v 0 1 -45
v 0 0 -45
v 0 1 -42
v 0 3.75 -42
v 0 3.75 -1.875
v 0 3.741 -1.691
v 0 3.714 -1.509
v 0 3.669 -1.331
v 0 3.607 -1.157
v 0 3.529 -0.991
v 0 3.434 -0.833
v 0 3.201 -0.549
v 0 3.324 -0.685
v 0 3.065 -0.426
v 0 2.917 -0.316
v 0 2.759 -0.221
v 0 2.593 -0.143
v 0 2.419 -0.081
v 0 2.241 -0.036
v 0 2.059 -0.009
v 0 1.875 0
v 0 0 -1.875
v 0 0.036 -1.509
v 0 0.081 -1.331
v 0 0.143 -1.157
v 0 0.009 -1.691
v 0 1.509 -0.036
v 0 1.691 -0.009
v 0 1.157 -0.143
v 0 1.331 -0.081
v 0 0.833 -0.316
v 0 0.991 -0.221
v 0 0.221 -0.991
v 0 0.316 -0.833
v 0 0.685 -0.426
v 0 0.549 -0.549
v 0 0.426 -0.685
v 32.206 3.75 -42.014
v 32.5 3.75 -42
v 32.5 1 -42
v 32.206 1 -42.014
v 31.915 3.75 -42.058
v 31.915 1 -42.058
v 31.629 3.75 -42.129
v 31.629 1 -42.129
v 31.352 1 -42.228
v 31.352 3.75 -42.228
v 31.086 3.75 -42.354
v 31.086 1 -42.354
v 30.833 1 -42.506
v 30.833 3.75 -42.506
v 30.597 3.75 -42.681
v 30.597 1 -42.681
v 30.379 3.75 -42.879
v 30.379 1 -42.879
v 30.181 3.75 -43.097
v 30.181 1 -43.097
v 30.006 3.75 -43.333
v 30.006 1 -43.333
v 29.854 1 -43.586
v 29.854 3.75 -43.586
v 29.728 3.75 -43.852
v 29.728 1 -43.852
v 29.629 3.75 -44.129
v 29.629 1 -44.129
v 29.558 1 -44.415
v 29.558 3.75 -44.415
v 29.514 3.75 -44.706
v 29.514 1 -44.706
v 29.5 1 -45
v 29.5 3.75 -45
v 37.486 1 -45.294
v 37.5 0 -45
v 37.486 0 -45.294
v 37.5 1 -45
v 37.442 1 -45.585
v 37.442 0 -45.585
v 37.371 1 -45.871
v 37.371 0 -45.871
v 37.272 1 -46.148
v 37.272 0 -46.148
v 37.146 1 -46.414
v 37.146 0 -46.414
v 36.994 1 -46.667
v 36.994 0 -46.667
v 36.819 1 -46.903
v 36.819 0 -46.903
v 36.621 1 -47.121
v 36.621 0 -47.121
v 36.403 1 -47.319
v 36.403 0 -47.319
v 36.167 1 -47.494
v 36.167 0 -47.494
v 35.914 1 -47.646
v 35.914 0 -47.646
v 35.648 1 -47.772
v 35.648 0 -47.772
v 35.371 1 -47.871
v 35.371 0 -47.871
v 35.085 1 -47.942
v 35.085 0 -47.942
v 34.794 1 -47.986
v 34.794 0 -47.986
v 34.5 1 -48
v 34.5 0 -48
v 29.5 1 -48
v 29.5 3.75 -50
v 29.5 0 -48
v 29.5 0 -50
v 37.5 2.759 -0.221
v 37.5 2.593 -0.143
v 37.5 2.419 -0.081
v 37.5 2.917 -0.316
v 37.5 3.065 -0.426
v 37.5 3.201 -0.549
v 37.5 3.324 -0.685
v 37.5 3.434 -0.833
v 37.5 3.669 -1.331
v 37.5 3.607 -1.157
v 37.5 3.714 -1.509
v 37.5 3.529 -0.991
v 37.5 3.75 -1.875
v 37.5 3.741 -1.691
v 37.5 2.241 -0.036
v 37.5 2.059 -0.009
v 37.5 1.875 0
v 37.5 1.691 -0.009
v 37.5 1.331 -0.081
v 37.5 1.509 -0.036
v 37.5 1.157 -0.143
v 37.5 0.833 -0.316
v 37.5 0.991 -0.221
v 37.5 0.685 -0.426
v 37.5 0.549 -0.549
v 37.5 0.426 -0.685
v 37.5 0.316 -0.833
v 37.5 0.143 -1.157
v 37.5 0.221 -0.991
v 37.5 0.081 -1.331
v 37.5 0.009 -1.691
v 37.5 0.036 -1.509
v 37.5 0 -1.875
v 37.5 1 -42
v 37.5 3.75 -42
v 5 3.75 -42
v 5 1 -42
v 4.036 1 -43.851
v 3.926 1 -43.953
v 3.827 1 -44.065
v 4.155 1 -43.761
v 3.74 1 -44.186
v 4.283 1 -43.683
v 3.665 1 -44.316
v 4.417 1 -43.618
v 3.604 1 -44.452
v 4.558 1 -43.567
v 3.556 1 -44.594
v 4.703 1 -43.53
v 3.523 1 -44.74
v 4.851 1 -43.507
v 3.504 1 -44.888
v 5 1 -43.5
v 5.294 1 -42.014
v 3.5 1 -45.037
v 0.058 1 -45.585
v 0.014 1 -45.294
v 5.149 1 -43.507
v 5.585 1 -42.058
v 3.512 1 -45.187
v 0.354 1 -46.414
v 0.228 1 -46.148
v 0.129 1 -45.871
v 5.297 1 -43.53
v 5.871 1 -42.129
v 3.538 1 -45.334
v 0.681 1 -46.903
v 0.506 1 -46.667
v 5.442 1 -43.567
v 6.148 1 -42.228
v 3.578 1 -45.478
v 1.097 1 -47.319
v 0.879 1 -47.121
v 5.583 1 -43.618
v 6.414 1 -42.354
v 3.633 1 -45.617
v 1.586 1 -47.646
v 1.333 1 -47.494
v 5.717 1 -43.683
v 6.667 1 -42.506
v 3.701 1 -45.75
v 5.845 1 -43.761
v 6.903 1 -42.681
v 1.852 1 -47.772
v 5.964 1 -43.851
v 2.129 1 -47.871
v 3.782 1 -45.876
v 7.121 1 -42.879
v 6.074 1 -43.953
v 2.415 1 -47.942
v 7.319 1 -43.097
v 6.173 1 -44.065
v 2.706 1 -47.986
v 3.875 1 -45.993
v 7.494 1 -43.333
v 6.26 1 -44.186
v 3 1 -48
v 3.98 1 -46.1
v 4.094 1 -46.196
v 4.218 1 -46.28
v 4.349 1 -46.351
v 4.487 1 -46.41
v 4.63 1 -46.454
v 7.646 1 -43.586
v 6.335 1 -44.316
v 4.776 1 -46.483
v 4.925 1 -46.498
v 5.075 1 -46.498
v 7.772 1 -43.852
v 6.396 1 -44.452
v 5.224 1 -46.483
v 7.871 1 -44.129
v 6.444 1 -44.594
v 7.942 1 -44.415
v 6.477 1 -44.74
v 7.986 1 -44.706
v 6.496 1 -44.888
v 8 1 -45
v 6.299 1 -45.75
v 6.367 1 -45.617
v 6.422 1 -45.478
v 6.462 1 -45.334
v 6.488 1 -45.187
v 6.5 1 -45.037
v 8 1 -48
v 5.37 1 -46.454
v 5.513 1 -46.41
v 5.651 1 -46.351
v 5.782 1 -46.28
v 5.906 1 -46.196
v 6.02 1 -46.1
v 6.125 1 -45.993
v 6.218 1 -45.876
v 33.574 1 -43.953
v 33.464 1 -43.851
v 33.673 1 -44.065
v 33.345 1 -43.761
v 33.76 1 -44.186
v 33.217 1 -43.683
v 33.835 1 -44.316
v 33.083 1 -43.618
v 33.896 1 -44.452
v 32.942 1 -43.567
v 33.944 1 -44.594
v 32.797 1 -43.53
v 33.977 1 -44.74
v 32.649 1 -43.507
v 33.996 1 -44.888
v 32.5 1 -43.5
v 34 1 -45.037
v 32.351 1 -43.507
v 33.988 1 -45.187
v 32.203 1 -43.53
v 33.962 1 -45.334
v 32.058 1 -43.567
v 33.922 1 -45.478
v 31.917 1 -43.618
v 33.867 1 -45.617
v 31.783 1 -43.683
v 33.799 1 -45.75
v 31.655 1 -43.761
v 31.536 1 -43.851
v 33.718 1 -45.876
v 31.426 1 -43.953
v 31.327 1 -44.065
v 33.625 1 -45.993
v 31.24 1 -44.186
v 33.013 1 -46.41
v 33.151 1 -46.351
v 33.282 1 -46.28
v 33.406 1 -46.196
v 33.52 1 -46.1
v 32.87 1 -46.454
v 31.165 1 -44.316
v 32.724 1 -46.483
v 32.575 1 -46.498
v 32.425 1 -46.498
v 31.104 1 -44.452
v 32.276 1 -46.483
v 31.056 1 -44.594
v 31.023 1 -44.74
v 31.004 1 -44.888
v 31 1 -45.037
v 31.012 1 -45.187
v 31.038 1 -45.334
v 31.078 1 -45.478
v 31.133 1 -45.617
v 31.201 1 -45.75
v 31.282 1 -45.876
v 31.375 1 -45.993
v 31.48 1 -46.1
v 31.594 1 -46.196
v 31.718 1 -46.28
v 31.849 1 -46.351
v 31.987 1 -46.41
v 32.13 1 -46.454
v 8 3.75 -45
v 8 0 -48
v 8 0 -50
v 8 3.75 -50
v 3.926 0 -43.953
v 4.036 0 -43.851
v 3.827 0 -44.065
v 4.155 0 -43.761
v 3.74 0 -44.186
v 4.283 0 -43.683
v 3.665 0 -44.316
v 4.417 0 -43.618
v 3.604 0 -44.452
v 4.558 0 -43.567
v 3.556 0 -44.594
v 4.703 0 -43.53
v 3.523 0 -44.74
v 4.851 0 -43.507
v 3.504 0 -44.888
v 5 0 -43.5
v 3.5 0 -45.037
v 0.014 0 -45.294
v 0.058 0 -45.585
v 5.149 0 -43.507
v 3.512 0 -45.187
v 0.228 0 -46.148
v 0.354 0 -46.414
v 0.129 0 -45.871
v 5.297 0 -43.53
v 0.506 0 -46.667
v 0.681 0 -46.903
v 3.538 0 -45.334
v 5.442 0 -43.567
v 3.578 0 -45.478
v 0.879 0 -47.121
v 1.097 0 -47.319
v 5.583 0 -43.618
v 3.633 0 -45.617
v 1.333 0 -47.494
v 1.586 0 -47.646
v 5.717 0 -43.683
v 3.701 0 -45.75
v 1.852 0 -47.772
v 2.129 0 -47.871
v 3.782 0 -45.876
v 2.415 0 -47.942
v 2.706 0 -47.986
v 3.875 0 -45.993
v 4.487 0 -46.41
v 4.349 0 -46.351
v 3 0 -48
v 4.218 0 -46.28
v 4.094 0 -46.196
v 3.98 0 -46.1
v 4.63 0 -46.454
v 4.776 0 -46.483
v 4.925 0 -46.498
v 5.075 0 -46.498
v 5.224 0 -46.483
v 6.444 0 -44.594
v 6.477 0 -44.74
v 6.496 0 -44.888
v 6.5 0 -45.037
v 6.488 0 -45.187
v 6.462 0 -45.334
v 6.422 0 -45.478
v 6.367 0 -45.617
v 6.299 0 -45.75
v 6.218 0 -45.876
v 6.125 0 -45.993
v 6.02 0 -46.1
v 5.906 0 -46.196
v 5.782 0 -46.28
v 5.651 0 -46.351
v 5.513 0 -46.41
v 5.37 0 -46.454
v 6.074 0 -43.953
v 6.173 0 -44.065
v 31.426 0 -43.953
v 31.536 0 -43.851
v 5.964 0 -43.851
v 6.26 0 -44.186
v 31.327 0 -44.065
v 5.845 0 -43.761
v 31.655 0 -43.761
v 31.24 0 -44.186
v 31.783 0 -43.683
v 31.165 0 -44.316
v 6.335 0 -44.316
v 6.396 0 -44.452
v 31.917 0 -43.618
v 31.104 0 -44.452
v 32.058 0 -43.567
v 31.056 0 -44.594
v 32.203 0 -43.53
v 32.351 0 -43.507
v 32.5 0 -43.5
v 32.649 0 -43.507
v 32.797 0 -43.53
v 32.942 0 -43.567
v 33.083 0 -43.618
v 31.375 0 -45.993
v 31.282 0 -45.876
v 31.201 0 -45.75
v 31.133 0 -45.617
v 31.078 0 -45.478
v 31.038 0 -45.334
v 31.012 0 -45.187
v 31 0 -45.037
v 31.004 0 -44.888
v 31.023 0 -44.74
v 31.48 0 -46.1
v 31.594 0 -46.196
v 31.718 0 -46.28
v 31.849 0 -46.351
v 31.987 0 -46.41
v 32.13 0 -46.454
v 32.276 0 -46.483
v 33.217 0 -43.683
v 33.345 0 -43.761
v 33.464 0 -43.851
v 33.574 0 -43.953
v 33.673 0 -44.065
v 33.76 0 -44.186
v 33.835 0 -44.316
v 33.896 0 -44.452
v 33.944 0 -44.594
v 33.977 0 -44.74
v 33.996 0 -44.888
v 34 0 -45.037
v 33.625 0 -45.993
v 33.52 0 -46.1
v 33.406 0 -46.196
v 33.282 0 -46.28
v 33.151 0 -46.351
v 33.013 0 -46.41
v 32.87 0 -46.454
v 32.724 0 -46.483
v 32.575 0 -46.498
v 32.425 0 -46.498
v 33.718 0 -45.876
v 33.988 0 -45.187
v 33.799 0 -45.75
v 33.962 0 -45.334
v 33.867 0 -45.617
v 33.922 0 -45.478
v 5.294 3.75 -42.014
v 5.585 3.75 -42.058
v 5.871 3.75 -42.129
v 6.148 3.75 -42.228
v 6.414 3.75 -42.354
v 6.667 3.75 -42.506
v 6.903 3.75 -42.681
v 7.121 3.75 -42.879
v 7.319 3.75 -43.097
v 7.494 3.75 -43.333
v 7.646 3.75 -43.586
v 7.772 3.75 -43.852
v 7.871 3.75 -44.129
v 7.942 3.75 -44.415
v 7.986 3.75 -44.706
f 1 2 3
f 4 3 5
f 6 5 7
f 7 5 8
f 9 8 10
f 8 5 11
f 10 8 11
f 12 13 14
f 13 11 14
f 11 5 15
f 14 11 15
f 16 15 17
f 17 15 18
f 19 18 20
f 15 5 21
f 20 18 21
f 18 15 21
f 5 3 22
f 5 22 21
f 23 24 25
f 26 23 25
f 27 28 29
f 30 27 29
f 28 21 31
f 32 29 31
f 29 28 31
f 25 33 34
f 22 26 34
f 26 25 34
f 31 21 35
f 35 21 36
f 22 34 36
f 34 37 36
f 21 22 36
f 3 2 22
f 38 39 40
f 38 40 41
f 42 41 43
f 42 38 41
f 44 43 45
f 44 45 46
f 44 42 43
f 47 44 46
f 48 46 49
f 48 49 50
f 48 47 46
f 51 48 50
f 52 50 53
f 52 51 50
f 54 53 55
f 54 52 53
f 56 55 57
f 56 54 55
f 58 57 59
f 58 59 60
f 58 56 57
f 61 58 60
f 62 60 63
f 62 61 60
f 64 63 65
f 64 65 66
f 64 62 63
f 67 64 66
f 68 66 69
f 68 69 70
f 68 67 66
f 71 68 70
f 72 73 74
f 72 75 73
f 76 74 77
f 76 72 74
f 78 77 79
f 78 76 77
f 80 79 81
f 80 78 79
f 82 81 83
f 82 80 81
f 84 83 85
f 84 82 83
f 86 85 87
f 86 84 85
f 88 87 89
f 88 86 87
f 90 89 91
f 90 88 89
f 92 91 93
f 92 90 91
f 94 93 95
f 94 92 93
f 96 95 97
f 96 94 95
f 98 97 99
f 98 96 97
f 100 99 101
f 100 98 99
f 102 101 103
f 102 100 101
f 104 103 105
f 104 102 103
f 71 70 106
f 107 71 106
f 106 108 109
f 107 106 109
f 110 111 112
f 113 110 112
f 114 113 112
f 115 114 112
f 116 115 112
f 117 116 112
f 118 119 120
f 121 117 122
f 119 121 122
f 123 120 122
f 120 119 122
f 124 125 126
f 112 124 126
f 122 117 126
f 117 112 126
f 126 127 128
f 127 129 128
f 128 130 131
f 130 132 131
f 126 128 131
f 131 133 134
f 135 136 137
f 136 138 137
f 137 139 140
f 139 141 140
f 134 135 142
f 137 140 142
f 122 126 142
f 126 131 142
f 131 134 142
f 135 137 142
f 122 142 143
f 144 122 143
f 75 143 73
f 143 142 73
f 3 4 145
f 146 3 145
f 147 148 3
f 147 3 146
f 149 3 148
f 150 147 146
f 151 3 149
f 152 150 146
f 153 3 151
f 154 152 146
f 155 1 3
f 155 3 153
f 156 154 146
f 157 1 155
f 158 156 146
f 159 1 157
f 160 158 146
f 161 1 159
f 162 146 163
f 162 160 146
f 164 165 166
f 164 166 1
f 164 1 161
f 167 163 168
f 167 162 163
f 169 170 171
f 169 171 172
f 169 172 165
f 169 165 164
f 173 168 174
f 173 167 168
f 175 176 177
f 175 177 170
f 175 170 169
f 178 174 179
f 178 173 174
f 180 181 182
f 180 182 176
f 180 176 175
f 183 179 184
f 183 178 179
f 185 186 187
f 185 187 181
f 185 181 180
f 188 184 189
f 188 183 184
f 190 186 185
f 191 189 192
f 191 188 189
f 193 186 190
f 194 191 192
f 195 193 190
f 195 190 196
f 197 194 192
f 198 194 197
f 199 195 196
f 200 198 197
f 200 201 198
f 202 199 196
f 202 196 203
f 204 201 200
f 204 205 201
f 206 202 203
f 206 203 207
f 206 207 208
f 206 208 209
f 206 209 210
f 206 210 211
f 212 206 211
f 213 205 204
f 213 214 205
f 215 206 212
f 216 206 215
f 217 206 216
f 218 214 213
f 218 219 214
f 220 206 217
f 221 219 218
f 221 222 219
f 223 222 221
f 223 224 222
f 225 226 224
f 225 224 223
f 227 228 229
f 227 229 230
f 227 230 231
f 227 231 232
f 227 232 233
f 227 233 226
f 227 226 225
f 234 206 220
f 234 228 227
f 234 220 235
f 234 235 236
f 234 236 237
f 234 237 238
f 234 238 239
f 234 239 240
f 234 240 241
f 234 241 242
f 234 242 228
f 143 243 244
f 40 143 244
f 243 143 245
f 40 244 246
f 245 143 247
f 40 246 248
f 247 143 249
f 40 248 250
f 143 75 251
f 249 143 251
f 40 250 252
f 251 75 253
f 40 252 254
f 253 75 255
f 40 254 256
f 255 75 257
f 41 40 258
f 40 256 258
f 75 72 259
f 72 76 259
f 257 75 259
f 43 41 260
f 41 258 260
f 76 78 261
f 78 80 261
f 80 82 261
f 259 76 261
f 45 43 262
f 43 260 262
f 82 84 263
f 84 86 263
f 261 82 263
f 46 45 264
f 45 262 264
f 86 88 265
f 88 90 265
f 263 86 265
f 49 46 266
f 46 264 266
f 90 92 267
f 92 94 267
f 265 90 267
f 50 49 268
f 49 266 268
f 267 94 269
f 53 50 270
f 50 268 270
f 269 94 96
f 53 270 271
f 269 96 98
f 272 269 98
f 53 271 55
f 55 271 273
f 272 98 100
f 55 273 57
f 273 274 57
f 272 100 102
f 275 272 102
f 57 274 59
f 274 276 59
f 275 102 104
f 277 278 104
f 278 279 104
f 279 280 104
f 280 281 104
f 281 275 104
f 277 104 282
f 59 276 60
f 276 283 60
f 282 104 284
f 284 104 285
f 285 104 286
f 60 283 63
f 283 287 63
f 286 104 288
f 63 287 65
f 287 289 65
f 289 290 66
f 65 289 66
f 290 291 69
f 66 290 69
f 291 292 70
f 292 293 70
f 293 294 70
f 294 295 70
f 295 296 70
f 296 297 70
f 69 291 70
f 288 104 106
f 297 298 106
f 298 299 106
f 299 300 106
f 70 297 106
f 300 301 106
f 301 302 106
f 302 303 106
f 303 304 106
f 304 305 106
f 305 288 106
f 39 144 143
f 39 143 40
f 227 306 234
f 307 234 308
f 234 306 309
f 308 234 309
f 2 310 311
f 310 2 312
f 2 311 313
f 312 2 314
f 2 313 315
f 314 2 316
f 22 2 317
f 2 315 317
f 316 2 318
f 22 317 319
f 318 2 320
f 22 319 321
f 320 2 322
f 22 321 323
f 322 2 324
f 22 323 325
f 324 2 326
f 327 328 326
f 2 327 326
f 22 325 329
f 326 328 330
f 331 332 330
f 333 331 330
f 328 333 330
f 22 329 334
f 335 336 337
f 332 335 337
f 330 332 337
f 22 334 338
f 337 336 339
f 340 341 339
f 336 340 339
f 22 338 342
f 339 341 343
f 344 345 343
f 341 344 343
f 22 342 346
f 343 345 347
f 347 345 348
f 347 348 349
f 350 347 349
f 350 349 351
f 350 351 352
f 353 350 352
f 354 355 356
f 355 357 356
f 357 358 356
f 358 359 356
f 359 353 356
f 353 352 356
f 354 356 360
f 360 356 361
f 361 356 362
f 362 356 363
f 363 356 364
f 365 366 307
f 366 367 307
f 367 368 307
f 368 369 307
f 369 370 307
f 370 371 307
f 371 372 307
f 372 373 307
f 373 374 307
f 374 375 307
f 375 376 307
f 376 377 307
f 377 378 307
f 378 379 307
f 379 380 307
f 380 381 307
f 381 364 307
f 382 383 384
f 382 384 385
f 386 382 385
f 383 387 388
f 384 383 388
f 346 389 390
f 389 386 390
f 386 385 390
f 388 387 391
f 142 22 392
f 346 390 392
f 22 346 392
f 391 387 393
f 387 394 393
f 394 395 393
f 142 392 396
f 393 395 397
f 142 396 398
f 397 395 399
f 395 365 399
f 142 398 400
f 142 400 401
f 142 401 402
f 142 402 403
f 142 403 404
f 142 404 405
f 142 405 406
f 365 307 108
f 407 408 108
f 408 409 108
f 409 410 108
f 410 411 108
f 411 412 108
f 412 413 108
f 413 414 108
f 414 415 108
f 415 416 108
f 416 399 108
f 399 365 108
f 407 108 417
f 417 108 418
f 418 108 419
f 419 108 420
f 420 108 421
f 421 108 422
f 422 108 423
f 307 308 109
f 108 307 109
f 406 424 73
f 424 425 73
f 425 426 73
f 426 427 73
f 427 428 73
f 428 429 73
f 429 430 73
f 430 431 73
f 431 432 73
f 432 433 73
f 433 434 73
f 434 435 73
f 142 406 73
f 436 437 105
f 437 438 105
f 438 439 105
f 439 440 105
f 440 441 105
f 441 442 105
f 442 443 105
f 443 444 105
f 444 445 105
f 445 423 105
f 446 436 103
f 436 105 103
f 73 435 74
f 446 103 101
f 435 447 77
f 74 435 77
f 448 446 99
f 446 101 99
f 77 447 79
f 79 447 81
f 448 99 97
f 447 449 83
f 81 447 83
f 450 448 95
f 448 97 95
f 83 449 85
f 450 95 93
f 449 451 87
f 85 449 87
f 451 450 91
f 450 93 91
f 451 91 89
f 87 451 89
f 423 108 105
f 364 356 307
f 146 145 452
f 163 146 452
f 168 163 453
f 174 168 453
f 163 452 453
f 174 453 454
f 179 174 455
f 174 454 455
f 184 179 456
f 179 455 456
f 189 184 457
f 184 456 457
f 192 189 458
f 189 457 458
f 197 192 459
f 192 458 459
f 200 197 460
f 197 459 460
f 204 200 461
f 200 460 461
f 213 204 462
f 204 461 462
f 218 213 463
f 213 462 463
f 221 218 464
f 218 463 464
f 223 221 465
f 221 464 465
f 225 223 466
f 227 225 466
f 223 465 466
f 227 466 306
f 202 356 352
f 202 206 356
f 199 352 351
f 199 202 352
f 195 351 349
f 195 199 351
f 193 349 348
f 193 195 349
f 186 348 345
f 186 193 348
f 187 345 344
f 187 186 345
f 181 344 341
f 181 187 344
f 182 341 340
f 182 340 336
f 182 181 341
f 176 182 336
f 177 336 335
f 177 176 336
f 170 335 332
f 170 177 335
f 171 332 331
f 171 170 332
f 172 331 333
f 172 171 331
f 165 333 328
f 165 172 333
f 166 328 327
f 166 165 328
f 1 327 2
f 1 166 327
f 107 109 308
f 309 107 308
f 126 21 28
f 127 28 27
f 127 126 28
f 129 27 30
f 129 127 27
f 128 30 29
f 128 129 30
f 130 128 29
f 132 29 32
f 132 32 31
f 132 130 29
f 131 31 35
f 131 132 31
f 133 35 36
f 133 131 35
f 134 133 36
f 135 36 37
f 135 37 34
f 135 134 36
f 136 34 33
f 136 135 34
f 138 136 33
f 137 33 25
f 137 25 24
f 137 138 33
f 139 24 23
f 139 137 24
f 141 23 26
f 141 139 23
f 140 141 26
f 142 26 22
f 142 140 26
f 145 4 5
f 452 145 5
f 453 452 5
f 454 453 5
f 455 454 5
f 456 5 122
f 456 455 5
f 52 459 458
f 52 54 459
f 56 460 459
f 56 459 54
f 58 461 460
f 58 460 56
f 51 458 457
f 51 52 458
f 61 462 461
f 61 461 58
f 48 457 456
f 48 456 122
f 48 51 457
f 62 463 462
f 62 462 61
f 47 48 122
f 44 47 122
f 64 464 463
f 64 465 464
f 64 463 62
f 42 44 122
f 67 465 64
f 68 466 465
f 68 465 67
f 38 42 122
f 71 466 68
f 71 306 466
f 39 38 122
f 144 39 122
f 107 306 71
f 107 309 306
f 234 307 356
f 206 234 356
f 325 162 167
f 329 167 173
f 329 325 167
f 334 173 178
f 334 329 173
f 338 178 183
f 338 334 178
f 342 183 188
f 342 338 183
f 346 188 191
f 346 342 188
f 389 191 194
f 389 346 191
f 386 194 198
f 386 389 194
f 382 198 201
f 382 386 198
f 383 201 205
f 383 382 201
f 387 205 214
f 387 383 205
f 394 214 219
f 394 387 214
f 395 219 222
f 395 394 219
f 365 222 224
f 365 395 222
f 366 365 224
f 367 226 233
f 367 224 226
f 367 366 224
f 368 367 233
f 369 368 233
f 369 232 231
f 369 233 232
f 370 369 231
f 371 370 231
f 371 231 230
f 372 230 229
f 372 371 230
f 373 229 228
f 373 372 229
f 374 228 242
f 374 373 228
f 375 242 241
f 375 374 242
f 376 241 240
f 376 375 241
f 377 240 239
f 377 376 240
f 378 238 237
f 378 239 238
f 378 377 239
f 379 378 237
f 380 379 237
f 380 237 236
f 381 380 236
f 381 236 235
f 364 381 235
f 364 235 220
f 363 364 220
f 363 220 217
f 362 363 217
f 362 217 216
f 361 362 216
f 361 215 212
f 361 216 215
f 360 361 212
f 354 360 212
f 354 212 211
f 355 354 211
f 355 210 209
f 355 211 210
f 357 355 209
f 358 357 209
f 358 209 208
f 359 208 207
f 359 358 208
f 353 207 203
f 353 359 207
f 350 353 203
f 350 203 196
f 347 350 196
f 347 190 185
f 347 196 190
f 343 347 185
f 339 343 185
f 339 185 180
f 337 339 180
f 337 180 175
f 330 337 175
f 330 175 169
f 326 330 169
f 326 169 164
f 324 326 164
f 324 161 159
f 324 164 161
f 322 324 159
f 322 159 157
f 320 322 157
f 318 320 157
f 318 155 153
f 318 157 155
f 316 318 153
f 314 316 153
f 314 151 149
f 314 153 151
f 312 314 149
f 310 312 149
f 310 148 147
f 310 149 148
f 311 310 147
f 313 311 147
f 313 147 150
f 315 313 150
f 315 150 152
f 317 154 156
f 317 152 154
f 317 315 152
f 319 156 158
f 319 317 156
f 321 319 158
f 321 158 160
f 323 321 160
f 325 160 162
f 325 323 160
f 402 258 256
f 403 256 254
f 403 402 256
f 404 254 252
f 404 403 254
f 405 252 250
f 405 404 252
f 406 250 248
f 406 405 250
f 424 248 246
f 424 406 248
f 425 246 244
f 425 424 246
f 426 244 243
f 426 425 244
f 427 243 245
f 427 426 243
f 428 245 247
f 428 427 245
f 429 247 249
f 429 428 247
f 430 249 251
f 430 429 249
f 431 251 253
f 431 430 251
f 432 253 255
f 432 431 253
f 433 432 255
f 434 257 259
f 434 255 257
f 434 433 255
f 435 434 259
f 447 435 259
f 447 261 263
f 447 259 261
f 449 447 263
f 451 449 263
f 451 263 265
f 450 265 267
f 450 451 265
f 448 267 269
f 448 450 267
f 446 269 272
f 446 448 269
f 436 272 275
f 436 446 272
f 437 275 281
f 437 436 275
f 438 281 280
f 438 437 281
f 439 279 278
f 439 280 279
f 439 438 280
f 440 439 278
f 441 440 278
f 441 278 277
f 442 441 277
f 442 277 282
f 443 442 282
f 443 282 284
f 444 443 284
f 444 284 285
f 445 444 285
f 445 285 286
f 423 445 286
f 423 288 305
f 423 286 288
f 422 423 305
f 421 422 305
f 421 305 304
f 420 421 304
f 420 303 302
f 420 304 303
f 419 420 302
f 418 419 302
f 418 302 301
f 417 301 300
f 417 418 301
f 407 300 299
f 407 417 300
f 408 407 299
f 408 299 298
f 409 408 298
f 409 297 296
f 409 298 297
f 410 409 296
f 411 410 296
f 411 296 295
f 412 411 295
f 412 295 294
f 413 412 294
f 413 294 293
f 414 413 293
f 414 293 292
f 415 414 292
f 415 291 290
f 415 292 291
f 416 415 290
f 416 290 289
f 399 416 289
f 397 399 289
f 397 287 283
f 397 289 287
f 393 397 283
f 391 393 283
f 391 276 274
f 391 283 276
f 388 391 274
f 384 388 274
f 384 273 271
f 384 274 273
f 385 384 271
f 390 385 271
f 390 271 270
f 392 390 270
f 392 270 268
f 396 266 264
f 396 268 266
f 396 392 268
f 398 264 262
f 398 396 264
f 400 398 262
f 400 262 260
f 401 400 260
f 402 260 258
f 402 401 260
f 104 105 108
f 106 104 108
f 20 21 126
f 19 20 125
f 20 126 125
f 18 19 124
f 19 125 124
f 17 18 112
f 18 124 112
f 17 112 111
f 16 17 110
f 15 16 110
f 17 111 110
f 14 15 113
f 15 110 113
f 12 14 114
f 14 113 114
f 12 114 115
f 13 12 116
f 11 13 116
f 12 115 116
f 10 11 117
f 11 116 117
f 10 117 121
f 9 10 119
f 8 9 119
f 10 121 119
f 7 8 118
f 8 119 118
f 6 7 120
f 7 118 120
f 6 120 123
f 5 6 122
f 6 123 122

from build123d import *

# Parameters (mm, degrees)
SKETCH1_R           = 1.5
BOSS_EXTRUDE1_DEPTH = 3.75
FILLET1_R           = 1.875
CUT_EXTRUDE1_DEPTH  = 2.75
FILLET2_R           = 3


with BuildPart() as part:
    # Sketch1 → Boss-Extrude1 (new body)
    with BuildSketch(Plane(origin=(0, 0, 0), x_dir=(1, 0, 0), z_dir=(0, 1, 0))):
        Polygon((0, 0), (37.5, 0), (37.5, 48), (29.5, 48), (29.5, 50), (8, 50), (8, 48), (0, 48), align=None)
        with Locations(Location((5, 45, 0), (0, 0, 270))):
            Circle(SKETCH1_R, mode=Mode.SUBTRACT)
        with Locations(Location((32.5, 45, 0), (0, 0, 270))):
            Circle(SKETCH1_R, mode=Mode.SUBTRACT)
    extrude(amount=BOSS_EXTRUDE1_DEPTH)

    # Fillet1
    fillet1_edges = [part.edges().sort_by_distance(p)[0] for p in [
        (18.75, 0, 0),
        (18.75, 3.75, 0),
    ]]
    fillet(fillet1_edges, radius=FILLET1_R - 0.0001)  # a hair under: the kernel refuses the full size

    # Sketch2 → Cut-Extrude1 (cut)
    with BuildSketch(Plane(origin=(0, 3.75, 0), x_dir=(1, 0, 0), z_dir=(0, 1, 0))):
        with BuildLine():
            Line((8, 48), (0, 48))
            Line((0, 48), (0, 42))
            Line((0, 42), (5, 42))
            ThreePointArc((5, 42), (7.121320344, 42.878679656), (8, 45))
            Line((8, 45), (8, 48))
        make_face()
        with BuildLine():
            Line((29.5, 48), (37.5, 48))
            Line((37.5, 48), (37.5, 42))
            Line((37.5, 42), (32.5, 42))
            ThreePointArc((32.5, 42), (30.378679656, 42.878679656), (29.5, 45))
            Line((29.5, 45), (29.5, 48))
        make_face()
    extrude(amount=-CUT_EXTRUDE1_DEPTH, mode=Mode.SUBTRACT)

    # Fillet2
    fillet2_edges = [part.edges().sort_by_distance(p)[0] for p in [
        (0, 0.5, -48),
        (37.5, 0.5, -48),
    ]]
    fillet(fillet2_edges, radius=FILLET2_R)


solid = part.part
